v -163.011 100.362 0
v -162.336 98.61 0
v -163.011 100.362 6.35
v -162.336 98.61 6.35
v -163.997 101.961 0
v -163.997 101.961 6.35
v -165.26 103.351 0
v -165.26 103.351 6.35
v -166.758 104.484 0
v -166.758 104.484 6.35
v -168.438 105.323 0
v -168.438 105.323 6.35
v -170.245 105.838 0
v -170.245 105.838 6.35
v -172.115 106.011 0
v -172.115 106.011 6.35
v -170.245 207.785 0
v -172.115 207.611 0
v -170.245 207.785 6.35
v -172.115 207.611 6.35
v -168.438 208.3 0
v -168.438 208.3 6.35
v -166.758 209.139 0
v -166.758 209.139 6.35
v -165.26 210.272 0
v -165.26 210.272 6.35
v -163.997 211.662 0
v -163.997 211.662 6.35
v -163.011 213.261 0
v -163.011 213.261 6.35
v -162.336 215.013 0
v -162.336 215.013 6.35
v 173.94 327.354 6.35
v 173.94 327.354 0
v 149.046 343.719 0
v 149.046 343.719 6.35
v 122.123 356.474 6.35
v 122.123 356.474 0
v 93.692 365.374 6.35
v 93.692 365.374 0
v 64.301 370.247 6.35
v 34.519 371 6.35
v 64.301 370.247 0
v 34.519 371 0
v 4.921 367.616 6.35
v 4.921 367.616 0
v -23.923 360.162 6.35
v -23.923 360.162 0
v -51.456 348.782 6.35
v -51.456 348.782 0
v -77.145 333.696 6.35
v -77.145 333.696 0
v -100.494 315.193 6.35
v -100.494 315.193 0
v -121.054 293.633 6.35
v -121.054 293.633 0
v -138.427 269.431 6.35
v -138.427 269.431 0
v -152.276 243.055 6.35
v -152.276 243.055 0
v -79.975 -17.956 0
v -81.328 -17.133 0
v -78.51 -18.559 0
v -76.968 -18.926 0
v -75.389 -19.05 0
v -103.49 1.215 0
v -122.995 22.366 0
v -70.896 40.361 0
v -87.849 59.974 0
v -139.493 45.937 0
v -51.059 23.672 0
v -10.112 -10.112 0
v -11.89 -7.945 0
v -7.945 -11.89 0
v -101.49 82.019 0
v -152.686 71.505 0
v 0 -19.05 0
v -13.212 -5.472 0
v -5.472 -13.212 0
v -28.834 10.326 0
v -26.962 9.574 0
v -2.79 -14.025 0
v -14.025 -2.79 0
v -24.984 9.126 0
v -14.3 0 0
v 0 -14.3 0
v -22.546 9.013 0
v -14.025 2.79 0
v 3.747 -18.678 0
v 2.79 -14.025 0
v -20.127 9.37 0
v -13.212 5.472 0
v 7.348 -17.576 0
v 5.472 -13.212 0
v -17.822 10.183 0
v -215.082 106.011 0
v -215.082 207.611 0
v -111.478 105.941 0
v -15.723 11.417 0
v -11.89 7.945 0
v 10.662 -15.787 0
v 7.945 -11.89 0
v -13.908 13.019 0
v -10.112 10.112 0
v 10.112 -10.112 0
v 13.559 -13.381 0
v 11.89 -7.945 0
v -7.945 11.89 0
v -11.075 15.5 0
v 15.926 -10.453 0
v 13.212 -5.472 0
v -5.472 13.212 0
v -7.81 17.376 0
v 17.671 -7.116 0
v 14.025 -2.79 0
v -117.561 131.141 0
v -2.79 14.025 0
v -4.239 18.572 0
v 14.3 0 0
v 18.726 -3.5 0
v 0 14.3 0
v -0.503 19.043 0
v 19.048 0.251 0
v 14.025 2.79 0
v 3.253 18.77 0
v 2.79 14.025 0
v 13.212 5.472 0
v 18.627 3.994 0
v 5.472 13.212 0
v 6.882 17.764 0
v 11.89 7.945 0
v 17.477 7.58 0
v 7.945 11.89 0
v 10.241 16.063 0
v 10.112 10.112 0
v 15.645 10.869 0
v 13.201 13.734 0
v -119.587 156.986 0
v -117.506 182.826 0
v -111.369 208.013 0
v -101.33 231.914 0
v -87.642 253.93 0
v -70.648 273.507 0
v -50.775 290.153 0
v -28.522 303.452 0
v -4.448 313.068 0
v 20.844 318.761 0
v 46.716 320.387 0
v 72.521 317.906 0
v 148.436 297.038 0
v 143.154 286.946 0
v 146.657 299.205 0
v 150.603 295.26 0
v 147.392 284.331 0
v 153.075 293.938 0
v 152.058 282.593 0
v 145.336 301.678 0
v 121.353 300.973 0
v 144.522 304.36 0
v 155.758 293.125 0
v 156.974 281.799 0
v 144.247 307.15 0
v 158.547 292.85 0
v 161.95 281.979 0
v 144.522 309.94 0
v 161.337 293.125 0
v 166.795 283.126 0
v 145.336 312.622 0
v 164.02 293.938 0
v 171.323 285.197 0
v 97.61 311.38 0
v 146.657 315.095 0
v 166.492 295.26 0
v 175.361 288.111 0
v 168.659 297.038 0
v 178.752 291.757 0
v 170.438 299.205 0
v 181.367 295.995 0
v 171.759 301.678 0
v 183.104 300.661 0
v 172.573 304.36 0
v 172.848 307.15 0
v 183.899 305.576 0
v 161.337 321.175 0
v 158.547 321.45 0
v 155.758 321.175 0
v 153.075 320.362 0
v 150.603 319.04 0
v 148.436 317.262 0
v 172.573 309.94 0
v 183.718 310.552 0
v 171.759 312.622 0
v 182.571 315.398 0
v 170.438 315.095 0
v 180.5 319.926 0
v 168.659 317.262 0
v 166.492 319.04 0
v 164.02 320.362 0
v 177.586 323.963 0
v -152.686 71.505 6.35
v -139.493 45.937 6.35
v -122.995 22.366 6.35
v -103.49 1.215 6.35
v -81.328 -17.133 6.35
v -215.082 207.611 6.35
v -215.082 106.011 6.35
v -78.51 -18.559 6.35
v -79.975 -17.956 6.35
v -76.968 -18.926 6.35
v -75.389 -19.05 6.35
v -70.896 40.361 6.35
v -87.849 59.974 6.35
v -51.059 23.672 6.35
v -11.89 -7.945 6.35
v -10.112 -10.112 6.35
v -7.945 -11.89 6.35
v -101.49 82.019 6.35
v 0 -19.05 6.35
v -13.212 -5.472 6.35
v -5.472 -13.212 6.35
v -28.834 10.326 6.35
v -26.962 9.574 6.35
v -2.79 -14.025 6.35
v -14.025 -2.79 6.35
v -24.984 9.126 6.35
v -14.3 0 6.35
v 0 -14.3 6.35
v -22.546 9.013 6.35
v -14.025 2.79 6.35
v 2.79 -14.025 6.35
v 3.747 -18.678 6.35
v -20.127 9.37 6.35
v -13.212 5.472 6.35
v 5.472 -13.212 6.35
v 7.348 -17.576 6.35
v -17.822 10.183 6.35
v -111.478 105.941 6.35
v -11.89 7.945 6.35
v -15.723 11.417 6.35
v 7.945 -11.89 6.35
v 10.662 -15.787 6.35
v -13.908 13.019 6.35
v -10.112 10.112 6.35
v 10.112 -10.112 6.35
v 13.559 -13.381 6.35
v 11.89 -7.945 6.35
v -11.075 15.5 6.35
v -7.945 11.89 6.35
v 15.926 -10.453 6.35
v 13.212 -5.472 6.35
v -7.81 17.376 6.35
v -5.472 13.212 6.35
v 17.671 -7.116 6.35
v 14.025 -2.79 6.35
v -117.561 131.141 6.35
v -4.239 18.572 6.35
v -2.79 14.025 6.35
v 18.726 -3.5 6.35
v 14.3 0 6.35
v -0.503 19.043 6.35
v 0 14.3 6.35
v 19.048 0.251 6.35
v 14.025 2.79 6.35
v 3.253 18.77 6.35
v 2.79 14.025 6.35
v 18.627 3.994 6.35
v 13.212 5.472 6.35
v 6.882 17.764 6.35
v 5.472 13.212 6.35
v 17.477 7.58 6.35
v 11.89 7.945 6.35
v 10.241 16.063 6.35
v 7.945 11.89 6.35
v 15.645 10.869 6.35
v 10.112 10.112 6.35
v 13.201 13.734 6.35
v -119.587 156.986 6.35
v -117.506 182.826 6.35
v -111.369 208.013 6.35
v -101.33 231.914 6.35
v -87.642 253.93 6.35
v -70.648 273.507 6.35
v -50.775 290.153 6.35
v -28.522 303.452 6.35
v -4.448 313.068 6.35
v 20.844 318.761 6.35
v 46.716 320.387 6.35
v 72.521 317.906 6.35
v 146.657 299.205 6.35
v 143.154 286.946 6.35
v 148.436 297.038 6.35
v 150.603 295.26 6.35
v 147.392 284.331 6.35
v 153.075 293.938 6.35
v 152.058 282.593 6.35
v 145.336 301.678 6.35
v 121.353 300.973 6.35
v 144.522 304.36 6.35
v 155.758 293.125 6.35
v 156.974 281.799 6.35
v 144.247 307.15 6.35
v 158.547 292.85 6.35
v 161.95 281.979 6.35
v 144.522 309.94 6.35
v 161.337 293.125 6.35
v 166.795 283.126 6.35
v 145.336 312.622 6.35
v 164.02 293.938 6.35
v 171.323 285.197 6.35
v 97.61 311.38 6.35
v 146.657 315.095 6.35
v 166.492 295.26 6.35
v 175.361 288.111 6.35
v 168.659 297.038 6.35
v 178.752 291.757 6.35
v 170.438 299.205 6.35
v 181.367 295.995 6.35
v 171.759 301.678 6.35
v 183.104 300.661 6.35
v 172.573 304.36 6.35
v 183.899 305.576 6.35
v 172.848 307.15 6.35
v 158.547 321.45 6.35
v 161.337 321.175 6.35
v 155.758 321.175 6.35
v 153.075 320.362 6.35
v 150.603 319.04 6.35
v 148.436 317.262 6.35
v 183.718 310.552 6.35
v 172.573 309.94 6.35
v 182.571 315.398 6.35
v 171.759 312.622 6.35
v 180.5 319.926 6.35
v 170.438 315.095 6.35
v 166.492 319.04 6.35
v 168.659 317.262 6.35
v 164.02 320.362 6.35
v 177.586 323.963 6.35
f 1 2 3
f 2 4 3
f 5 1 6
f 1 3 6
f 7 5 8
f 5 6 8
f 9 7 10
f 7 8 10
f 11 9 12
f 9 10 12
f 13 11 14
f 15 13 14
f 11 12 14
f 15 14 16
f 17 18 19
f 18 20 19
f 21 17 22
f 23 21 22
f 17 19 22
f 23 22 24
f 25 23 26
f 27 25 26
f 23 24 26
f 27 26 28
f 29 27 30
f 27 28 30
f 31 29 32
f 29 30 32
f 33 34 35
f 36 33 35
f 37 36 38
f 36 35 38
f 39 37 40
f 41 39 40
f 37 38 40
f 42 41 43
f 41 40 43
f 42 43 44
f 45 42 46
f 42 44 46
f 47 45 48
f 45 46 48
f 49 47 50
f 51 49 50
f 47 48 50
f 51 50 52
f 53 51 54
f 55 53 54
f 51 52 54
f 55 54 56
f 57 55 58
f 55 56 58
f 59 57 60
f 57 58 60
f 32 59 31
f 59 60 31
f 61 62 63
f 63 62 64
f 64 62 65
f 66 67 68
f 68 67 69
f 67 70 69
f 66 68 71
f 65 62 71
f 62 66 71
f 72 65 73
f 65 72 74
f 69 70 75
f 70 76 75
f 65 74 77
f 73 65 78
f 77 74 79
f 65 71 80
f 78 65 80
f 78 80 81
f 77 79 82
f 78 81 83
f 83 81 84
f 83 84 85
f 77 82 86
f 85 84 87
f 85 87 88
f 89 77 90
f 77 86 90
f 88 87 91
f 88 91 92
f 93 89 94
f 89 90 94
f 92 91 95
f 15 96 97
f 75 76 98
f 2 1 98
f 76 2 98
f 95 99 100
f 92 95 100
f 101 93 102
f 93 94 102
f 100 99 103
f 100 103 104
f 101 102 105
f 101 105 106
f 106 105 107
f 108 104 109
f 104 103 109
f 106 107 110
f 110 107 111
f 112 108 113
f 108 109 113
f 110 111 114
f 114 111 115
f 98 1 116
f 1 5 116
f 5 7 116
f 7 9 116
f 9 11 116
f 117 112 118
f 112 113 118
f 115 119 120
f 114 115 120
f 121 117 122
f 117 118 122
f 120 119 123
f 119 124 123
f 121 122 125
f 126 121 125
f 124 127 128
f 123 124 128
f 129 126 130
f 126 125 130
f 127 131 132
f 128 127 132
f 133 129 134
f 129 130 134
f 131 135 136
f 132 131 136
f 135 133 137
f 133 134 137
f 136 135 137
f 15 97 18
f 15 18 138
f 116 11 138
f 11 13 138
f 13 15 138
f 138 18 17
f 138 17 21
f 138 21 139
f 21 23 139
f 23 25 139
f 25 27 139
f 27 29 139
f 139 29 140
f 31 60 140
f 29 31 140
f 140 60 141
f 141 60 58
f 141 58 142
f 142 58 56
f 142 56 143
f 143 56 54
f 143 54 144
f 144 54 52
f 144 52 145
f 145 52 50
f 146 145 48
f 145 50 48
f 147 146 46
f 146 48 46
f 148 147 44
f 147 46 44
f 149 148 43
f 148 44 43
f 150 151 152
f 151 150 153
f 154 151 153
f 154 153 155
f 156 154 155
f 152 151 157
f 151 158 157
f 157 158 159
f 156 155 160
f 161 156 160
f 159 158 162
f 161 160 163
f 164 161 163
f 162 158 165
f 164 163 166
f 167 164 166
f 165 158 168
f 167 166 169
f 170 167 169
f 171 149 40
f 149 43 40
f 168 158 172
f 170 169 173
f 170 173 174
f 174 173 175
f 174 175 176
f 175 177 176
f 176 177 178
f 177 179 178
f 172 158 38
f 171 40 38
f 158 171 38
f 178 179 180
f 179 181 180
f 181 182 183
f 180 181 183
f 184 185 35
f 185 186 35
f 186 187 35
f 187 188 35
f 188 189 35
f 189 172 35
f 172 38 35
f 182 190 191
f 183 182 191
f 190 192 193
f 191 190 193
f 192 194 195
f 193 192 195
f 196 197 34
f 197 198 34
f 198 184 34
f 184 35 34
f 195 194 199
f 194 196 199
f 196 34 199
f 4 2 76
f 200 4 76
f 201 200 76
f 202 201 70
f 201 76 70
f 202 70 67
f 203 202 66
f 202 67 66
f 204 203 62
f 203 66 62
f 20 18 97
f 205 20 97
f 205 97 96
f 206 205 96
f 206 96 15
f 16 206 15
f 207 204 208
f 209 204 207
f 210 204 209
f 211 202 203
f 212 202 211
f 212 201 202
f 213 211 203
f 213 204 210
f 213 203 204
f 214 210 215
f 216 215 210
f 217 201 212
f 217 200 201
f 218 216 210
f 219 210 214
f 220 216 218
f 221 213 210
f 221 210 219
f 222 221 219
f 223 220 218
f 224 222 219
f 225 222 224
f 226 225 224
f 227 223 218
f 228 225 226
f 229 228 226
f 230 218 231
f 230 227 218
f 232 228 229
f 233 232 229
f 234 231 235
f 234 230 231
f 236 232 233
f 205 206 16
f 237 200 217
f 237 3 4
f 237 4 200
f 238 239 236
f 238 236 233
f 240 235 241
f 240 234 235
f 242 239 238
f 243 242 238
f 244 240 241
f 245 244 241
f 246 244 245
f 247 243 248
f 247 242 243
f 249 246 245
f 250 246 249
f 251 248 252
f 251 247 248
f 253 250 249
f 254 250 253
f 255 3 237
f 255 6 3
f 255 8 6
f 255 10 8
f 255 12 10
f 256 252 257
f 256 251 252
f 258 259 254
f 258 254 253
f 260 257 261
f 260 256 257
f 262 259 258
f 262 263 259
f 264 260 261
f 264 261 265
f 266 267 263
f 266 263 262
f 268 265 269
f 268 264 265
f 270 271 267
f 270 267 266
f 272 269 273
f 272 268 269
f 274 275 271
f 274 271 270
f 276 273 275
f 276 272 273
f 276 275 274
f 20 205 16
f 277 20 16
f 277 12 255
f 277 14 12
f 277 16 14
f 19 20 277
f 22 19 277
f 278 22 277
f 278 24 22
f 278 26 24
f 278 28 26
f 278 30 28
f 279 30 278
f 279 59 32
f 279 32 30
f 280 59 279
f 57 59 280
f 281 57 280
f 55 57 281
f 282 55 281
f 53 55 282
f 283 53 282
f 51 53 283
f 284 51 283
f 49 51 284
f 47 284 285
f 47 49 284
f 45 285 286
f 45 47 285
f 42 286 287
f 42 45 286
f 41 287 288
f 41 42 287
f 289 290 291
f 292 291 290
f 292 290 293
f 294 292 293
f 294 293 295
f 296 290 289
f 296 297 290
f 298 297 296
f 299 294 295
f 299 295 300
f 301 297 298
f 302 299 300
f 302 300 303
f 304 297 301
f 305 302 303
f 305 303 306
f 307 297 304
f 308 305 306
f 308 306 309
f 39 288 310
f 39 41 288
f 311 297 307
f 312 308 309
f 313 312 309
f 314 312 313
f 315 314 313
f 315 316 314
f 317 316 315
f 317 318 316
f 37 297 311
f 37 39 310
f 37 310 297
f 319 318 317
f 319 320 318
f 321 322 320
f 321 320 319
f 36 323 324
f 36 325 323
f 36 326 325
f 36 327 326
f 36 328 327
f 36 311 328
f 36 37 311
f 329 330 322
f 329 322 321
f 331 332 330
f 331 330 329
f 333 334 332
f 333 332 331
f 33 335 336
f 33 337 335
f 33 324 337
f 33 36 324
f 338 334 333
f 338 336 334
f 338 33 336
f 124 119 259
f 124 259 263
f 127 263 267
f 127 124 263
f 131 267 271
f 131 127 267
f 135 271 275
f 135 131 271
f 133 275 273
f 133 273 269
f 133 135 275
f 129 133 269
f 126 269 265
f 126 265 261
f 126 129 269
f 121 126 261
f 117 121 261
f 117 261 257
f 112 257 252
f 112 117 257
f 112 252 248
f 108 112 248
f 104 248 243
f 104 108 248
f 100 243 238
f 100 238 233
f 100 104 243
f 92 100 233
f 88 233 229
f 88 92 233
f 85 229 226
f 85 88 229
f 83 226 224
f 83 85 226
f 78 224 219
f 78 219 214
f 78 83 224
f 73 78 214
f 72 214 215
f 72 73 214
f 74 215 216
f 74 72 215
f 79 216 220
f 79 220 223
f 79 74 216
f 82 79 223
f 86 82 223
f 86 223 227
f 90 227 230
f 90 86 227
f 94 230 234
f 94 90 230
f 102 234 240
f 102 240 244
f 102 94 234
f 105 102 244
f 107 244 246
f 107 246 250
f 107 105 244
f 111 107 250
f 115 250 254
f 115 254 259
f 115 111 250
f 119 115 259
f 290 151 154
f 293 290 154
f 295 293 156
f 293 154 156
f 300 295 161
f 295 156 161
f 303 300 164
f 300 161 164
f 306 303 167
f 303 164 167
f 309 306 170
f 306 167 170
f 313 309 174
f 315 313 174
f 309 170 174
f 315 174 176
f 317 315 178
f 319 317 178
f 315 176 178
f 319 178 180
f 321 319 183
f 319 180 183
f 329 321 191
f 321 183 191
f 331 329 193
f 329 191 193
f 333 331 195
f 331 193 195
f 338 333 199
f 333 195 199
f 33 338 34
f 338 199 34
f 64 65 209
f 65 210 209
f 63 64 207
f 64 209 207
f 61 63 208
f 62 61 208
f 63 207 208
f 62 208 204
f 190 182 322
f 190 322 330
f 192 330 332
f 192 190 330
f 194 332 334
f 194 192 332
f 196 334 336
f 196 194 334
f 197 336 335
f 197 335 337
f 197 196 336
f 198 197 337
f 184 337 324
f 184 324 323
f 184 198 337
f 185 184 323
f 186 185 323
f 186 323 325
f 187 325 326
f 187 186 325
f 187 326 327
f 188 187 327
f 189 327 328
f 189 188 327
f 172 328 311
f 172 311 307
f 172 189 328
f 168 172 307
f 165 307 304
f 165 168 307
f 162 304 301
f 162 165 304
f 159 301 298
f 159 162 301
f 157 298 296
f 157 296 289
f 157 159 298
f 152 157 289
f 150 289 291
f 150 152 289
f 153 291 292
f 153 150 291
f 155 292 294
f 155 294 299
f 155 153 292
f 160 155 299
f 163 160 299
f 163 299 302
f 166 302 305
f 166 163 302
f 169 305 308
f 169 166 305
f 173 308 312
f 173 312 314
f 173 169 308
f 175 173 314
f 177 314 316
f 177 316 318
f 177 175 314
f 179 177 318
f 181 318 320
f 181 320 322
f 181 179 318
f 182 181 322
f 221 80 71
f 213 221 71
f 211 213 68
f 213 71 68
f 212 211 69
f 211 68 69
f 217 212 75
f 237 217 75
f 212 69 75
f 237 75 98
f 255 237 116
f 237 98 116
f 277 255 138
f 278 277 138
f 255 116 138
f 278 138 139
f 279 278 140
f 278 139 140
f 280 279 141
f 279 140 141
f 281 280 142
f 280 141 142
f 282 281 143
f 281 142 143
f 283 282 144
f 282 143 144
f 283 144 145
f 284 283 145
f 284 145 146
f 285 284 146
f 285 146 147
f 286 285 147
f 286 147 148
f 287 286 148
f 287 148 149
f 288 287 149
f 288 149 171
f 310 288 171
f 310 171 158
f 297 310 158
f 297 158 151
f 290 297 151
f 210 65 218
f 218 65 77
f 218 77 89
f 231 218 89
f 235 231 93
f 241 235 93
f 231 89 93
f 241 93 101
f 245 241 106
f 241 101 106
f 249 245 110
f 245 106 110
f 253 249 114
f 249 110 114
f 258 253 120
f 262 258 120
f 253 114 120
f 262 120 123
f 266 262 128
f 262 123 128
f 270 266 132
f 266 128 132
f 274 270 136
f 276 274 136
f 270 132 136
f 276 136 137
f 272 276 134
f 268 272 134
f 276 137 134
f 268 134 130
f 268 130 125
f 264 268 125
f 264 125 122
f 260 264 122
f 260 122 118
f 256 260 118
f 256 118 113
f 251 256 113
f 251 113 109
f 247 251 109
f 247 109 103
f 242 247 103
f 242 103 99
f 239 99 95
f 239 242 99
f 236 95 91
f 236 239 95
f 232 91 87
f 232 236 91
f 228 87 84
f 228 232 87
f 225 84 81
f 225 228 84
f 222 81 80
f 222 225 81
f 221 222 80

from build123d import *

# Parameters (mm, degrees)
SKETCH1_R           = 14.3002
BOSS_EXTRUDE1_DEPTH = 6.35
FILLET1_R           = 10.16
FILLET2_R           = 12.7


with BuildPart() as part:
    # Sketch1 → Boss-Extrude1 (new body)
    with BuildSketch(Plane.XY):
        with BuildLine():
            Line((-78.624201442, -19.05), (0, -19.05))
            ThreePointArc((0, -19.05), (15.29709191, 11.353478722), (-18.233617587, 5.517036315))
            ThreePointArc((-18.233617587, 5.517036315), (-97.907934324, 238.196201056), (143.154480855, 286.945585057))
            ThreePointArc((143.154480855, 286.945585057), (178.751803486, 291.757091583), (173.940297689, 327.354414313))
            ThreePointArc((173.940297689, 327.354414313), (-27.542038168, 358.917389173), (-164.282230707, 207.611497719))
            Line((-164.282230707, 207.611497719), (-215.082230707, 207.611497719))
            Line((-215.082230707, 207.611497719), (-215.082230707, 106.011497719))
            Line((-215.082230707, 106.011497719), (-164.282230707, 106.011497719))
            ThreePointArc((-164.282230707, 106.011497719), (-132.874579252, 35.657945846), (-78.624201442, -19.05))
        make_face()
        Circle(SKETCH1_R, mode=Mode.SUBTRACT)
        with Locations((158.547388858, 307.15)):
            Circle(SKETCH1_R, mode=Mode.SUBTRACT)
    extrude(amount=BOSS_EXTRUDE1_DEPTH)

    # Fillet1
    fillet1_edges = [part.edges().sort_by_distance(p)[0] for p in [
        (-78.624201442, -19.05, 3.175),
        (-164.282230707, 106.011497719, 3.175),
        (-164.282230707, 207.611497719, 3.175),
    ]]
    fillet(fillet1_edges, radius=FILLET1_R)

    # Fillet2
    fillet2_edges = [part.edges().sort_by_distance(p)[0] for p in [
        (-18.233617587, 5.517036315, 3.175),
    ]]
    fillet(fillet2_edges, radius=FILLET2_R)


solid = part.part
